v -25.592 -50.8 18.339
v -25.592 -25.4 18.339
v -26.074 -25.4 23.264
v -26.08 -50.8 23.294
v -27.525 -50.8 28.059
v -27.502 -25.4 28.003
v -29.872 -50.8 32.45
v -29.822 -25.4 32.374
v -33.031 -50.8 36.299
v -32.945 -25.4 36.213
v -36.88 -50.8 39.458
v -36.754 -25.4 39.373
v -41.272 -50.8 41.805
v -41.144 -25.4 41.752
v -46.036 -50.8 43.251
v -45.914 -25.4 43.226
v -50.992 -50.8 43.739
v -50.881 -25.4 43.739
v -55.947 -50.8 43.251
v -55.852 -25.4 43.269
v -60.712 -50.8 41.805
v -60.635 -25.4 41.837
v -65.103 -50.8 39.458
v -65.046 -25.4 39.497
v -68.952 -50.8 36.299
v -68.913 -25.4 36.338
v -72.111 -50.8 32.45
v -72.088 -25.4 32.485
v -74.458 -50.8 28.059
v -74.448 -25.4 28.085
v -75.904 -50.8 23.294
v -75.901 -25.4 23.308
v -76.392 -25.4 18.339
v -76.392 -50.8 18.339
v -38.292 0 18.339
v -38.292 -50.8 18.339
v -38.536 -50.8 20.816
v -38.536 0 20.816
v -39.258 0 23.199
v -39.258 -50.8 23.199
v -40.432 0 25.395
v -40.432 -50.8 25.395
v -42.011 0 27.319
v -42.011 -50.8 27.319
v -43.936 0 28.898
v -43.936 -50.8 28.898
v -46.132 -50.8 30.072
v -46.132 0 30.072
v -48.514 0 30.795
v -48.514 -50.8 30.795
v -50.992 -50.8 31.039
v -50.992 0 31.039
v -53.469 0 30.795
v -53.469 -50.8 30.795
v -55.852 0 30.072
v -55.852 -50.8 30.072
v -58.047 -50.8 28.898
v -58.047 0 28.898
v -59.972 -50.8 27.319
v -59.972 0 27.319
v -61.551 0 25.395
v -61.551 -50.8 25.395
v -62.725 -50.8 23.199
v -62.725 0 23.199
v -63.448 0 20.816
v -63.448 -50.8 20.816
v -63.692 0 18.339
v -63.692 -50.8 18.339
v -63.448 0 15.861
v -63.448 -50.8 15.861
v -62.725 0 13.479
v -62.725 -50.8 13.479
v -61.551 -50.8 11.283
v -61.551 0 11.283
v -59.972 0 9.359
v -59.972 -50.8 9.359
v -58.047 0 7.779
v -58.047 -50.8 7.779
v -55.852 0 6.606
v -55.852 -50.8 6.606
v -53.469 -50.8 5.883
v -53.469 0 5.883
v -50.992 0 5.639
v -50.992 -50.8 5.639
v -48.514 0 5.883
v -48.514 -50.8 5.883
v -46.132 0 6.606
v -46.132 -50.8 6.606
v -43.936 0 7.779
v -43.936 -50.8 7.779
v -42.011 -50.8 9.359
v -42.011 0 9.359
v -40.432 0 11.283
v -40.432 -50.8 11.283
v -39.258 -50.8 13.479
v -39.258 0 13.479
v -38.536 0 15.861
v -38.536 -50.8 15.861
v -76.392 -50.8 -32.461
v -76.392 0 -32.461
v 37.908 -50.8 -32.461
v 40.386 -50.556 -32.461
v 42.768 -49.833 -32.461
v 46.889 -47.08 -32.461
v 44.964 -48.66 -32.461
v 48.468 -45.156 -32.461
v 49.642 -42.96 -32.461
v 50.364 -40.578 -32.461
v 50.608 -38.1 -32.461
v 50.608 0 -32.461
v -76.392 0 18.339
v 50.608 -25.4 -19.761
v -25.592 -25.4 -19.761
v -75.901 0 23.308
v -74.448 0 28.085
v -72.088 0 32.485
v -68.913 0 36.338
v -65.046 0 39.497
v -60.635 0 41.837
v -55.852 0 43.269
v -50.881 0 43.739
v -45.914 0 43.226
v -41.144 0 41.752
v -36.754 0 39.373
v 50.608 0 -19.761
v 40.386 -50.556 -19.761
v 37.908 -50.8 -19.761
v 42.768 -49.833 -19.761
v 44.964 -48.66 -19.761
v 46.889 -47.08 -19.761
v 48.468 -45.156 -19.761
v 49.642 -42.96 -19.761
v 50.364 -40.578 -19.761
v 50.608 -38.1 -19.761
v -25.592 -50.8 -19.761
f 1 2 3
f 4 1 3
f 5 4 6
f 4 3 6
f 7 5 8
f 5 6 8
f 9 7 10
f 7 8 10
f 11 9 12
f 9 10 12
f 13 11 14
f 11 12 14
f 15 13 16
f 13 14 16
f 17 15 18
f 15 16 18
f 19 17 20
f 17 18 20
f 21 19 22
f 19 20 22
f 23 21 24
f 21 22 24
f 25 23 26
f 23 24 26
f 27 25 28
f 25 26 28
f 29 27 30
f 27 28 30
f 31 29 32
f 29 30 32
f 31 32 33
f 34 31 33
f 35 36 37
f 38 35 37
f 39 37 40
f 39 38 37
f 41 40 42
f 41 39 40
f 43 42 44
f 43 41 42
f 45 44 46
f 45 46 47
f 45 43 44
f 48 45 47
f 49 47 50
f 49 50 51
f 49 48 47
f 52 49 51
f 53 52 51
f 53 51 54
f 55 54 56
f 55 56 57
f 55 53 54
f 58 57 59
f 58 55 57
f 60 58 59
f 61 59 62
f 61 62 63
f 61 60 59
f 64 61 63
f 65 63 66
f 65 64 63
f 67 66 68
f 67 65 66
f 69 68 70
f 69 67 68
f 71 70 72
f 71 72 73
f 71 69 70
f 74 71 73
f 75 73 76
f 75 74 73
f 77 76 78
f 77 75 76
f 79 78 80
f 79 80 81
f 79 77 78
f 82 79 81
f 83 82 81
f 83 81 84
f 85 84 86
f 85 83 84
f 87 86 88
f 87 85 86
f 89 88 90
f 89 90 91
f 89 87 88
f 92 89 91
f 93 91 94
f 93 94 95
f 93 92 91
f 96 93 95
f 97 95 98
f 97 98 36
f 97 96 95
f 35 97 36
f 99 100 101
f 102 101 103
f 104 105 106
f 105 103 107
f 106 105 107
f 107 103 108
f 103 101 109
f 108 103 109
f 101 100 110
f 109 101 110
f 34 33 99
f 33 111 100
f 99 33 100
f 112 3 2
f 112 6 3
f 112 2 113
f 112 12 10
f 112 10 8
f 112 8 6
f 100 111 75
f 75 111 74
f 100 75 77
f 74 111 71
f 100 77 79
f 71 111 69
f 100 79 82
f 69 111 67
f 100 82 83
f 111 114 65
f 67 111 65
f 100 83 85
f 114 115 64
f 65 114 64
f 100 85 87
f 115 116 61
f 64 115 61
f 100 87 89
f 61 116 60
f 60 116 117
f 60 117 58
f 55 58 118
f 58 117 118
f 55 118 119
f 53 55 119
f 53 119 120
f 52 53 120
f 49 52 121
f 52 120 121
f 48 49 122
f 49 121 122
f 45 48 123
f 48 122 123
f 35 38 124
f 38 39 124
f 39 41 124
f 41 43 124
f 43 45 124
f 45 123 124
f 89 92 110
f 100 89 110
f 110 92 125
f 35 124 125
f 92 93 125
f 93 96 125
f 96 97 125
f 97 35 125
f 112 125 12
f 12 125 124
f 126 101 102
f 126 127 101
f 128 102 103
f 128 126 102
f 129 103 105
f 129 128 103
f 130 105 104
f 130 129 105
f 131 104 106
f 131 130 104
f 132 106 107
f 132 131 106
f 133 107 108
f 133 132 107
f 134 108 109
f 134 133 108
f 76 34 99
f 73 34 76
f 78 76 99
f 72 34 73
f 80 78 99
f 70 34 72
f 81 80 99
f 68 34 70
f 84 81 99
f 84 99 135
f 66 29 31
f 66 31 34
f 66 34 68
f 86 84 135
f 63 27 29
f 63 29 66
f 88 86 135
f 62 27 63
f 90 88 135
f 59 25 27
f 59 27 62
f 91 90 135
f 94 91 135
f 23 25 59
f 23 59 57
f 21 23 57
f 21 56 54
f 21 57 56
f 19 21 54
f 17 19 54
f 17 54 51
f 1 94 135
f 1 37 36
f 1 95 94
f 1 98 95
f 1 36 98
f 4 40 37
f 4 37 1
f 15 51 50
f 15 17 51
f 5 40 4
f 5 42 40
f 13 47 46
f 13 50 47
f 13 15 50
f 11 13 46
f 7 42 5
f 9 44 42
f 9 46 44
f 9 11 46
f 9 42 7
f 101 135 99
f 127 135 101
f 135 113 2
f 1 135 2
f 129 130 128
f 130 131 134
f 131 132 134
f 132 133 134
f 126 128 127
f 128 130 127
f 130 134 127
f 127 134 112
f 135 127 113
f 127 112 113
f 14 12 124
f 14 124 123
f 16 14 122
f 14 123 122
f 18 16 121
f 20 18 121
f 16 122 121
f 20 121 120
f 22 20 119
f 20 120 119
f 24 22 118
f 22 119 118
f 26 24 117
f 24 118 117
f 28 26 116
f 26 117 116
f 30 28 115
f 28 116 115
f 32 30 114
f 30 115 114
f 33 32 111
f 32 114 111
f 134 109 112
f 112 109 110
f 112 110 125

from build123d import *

# Parameters (mm, degrees)
F0_R     = 12.7
F1_DEPTH = 25.4
F2_R     = 12.7
F3_DEPTH = 25.4
F4_R     = 12.7


with BuildPart() as f1:
    # F0 (on Front) → F1 (new body)
    with BuildSketch(Plane.XZ):
        with BuildLine():
            Line((50.6083145556, -19.7611999094), (-36.7538123162, 39.3731284323))
            ThreePointArc((-36.7538123162, 39.3731284323), (-62.897944776, 40.7753994034), (-76.3916854444, 18.3388000906))
            Line((-76.3916854444, 18.3388000906), (-76.3916854444, -32.4611999094))
            Line((-76.3916854444, -32.4611999094), (50.6083145556, -32.4611999094))
            Line((50.6083145556, -32.4611999094), (50.6083145556, -19.7611999094))
        make_face()
        with Locations((-50.9916854444, 18.3388000906)):
            Circle(F0_R, mode=Mode.SUBTRACT)
    extrude(amount=F1_DEPTH)

    # F2 (on face) → F3 (join)
    with BuildSketch(Plane.XZ.offset(25.4)):
        with BuildLine():
            Line((-25.5916854444, -19.7611999094), (-25.5916854444, 18.3388000906))
            ThreePointArc((-25.5916854444, 18.3388000906), (-50.9916854444, 43.7388000906), (-76.3916854444, 18.3388000906))
            Line((-76.3916854444, 18.3388000906), (-76.3916854444, -19.7611999094))
            Line((-76.3916854444, -19.7611999094), (-76.3916854444, -32.4611999094))
            Line((-76.3916854444, -32.4611999094), (50.6083145556, -32.4611999094))
            Line((50.6083145556, -32.4611999094), (50.6083145556, -19.7611999094))
            Line((50.6083145556, -19.7611999094), (-25.5916854444, -19.7611999094))
        make_face()
        with Locations((-50.9916854444, 18.3388000906)):
            Circle(F2_R, mode=Mode.SUBTRACT)
    extrude(amount=F3_DEPTH)

    # F4
    f4_edges = [f1.edges().sort_by_distance(p)[0] for p in [
        (50.608315, -50.8, -26.1112),
    ]]
    fillet(f4_edges, radius=F4_R)


solid = f1.part
